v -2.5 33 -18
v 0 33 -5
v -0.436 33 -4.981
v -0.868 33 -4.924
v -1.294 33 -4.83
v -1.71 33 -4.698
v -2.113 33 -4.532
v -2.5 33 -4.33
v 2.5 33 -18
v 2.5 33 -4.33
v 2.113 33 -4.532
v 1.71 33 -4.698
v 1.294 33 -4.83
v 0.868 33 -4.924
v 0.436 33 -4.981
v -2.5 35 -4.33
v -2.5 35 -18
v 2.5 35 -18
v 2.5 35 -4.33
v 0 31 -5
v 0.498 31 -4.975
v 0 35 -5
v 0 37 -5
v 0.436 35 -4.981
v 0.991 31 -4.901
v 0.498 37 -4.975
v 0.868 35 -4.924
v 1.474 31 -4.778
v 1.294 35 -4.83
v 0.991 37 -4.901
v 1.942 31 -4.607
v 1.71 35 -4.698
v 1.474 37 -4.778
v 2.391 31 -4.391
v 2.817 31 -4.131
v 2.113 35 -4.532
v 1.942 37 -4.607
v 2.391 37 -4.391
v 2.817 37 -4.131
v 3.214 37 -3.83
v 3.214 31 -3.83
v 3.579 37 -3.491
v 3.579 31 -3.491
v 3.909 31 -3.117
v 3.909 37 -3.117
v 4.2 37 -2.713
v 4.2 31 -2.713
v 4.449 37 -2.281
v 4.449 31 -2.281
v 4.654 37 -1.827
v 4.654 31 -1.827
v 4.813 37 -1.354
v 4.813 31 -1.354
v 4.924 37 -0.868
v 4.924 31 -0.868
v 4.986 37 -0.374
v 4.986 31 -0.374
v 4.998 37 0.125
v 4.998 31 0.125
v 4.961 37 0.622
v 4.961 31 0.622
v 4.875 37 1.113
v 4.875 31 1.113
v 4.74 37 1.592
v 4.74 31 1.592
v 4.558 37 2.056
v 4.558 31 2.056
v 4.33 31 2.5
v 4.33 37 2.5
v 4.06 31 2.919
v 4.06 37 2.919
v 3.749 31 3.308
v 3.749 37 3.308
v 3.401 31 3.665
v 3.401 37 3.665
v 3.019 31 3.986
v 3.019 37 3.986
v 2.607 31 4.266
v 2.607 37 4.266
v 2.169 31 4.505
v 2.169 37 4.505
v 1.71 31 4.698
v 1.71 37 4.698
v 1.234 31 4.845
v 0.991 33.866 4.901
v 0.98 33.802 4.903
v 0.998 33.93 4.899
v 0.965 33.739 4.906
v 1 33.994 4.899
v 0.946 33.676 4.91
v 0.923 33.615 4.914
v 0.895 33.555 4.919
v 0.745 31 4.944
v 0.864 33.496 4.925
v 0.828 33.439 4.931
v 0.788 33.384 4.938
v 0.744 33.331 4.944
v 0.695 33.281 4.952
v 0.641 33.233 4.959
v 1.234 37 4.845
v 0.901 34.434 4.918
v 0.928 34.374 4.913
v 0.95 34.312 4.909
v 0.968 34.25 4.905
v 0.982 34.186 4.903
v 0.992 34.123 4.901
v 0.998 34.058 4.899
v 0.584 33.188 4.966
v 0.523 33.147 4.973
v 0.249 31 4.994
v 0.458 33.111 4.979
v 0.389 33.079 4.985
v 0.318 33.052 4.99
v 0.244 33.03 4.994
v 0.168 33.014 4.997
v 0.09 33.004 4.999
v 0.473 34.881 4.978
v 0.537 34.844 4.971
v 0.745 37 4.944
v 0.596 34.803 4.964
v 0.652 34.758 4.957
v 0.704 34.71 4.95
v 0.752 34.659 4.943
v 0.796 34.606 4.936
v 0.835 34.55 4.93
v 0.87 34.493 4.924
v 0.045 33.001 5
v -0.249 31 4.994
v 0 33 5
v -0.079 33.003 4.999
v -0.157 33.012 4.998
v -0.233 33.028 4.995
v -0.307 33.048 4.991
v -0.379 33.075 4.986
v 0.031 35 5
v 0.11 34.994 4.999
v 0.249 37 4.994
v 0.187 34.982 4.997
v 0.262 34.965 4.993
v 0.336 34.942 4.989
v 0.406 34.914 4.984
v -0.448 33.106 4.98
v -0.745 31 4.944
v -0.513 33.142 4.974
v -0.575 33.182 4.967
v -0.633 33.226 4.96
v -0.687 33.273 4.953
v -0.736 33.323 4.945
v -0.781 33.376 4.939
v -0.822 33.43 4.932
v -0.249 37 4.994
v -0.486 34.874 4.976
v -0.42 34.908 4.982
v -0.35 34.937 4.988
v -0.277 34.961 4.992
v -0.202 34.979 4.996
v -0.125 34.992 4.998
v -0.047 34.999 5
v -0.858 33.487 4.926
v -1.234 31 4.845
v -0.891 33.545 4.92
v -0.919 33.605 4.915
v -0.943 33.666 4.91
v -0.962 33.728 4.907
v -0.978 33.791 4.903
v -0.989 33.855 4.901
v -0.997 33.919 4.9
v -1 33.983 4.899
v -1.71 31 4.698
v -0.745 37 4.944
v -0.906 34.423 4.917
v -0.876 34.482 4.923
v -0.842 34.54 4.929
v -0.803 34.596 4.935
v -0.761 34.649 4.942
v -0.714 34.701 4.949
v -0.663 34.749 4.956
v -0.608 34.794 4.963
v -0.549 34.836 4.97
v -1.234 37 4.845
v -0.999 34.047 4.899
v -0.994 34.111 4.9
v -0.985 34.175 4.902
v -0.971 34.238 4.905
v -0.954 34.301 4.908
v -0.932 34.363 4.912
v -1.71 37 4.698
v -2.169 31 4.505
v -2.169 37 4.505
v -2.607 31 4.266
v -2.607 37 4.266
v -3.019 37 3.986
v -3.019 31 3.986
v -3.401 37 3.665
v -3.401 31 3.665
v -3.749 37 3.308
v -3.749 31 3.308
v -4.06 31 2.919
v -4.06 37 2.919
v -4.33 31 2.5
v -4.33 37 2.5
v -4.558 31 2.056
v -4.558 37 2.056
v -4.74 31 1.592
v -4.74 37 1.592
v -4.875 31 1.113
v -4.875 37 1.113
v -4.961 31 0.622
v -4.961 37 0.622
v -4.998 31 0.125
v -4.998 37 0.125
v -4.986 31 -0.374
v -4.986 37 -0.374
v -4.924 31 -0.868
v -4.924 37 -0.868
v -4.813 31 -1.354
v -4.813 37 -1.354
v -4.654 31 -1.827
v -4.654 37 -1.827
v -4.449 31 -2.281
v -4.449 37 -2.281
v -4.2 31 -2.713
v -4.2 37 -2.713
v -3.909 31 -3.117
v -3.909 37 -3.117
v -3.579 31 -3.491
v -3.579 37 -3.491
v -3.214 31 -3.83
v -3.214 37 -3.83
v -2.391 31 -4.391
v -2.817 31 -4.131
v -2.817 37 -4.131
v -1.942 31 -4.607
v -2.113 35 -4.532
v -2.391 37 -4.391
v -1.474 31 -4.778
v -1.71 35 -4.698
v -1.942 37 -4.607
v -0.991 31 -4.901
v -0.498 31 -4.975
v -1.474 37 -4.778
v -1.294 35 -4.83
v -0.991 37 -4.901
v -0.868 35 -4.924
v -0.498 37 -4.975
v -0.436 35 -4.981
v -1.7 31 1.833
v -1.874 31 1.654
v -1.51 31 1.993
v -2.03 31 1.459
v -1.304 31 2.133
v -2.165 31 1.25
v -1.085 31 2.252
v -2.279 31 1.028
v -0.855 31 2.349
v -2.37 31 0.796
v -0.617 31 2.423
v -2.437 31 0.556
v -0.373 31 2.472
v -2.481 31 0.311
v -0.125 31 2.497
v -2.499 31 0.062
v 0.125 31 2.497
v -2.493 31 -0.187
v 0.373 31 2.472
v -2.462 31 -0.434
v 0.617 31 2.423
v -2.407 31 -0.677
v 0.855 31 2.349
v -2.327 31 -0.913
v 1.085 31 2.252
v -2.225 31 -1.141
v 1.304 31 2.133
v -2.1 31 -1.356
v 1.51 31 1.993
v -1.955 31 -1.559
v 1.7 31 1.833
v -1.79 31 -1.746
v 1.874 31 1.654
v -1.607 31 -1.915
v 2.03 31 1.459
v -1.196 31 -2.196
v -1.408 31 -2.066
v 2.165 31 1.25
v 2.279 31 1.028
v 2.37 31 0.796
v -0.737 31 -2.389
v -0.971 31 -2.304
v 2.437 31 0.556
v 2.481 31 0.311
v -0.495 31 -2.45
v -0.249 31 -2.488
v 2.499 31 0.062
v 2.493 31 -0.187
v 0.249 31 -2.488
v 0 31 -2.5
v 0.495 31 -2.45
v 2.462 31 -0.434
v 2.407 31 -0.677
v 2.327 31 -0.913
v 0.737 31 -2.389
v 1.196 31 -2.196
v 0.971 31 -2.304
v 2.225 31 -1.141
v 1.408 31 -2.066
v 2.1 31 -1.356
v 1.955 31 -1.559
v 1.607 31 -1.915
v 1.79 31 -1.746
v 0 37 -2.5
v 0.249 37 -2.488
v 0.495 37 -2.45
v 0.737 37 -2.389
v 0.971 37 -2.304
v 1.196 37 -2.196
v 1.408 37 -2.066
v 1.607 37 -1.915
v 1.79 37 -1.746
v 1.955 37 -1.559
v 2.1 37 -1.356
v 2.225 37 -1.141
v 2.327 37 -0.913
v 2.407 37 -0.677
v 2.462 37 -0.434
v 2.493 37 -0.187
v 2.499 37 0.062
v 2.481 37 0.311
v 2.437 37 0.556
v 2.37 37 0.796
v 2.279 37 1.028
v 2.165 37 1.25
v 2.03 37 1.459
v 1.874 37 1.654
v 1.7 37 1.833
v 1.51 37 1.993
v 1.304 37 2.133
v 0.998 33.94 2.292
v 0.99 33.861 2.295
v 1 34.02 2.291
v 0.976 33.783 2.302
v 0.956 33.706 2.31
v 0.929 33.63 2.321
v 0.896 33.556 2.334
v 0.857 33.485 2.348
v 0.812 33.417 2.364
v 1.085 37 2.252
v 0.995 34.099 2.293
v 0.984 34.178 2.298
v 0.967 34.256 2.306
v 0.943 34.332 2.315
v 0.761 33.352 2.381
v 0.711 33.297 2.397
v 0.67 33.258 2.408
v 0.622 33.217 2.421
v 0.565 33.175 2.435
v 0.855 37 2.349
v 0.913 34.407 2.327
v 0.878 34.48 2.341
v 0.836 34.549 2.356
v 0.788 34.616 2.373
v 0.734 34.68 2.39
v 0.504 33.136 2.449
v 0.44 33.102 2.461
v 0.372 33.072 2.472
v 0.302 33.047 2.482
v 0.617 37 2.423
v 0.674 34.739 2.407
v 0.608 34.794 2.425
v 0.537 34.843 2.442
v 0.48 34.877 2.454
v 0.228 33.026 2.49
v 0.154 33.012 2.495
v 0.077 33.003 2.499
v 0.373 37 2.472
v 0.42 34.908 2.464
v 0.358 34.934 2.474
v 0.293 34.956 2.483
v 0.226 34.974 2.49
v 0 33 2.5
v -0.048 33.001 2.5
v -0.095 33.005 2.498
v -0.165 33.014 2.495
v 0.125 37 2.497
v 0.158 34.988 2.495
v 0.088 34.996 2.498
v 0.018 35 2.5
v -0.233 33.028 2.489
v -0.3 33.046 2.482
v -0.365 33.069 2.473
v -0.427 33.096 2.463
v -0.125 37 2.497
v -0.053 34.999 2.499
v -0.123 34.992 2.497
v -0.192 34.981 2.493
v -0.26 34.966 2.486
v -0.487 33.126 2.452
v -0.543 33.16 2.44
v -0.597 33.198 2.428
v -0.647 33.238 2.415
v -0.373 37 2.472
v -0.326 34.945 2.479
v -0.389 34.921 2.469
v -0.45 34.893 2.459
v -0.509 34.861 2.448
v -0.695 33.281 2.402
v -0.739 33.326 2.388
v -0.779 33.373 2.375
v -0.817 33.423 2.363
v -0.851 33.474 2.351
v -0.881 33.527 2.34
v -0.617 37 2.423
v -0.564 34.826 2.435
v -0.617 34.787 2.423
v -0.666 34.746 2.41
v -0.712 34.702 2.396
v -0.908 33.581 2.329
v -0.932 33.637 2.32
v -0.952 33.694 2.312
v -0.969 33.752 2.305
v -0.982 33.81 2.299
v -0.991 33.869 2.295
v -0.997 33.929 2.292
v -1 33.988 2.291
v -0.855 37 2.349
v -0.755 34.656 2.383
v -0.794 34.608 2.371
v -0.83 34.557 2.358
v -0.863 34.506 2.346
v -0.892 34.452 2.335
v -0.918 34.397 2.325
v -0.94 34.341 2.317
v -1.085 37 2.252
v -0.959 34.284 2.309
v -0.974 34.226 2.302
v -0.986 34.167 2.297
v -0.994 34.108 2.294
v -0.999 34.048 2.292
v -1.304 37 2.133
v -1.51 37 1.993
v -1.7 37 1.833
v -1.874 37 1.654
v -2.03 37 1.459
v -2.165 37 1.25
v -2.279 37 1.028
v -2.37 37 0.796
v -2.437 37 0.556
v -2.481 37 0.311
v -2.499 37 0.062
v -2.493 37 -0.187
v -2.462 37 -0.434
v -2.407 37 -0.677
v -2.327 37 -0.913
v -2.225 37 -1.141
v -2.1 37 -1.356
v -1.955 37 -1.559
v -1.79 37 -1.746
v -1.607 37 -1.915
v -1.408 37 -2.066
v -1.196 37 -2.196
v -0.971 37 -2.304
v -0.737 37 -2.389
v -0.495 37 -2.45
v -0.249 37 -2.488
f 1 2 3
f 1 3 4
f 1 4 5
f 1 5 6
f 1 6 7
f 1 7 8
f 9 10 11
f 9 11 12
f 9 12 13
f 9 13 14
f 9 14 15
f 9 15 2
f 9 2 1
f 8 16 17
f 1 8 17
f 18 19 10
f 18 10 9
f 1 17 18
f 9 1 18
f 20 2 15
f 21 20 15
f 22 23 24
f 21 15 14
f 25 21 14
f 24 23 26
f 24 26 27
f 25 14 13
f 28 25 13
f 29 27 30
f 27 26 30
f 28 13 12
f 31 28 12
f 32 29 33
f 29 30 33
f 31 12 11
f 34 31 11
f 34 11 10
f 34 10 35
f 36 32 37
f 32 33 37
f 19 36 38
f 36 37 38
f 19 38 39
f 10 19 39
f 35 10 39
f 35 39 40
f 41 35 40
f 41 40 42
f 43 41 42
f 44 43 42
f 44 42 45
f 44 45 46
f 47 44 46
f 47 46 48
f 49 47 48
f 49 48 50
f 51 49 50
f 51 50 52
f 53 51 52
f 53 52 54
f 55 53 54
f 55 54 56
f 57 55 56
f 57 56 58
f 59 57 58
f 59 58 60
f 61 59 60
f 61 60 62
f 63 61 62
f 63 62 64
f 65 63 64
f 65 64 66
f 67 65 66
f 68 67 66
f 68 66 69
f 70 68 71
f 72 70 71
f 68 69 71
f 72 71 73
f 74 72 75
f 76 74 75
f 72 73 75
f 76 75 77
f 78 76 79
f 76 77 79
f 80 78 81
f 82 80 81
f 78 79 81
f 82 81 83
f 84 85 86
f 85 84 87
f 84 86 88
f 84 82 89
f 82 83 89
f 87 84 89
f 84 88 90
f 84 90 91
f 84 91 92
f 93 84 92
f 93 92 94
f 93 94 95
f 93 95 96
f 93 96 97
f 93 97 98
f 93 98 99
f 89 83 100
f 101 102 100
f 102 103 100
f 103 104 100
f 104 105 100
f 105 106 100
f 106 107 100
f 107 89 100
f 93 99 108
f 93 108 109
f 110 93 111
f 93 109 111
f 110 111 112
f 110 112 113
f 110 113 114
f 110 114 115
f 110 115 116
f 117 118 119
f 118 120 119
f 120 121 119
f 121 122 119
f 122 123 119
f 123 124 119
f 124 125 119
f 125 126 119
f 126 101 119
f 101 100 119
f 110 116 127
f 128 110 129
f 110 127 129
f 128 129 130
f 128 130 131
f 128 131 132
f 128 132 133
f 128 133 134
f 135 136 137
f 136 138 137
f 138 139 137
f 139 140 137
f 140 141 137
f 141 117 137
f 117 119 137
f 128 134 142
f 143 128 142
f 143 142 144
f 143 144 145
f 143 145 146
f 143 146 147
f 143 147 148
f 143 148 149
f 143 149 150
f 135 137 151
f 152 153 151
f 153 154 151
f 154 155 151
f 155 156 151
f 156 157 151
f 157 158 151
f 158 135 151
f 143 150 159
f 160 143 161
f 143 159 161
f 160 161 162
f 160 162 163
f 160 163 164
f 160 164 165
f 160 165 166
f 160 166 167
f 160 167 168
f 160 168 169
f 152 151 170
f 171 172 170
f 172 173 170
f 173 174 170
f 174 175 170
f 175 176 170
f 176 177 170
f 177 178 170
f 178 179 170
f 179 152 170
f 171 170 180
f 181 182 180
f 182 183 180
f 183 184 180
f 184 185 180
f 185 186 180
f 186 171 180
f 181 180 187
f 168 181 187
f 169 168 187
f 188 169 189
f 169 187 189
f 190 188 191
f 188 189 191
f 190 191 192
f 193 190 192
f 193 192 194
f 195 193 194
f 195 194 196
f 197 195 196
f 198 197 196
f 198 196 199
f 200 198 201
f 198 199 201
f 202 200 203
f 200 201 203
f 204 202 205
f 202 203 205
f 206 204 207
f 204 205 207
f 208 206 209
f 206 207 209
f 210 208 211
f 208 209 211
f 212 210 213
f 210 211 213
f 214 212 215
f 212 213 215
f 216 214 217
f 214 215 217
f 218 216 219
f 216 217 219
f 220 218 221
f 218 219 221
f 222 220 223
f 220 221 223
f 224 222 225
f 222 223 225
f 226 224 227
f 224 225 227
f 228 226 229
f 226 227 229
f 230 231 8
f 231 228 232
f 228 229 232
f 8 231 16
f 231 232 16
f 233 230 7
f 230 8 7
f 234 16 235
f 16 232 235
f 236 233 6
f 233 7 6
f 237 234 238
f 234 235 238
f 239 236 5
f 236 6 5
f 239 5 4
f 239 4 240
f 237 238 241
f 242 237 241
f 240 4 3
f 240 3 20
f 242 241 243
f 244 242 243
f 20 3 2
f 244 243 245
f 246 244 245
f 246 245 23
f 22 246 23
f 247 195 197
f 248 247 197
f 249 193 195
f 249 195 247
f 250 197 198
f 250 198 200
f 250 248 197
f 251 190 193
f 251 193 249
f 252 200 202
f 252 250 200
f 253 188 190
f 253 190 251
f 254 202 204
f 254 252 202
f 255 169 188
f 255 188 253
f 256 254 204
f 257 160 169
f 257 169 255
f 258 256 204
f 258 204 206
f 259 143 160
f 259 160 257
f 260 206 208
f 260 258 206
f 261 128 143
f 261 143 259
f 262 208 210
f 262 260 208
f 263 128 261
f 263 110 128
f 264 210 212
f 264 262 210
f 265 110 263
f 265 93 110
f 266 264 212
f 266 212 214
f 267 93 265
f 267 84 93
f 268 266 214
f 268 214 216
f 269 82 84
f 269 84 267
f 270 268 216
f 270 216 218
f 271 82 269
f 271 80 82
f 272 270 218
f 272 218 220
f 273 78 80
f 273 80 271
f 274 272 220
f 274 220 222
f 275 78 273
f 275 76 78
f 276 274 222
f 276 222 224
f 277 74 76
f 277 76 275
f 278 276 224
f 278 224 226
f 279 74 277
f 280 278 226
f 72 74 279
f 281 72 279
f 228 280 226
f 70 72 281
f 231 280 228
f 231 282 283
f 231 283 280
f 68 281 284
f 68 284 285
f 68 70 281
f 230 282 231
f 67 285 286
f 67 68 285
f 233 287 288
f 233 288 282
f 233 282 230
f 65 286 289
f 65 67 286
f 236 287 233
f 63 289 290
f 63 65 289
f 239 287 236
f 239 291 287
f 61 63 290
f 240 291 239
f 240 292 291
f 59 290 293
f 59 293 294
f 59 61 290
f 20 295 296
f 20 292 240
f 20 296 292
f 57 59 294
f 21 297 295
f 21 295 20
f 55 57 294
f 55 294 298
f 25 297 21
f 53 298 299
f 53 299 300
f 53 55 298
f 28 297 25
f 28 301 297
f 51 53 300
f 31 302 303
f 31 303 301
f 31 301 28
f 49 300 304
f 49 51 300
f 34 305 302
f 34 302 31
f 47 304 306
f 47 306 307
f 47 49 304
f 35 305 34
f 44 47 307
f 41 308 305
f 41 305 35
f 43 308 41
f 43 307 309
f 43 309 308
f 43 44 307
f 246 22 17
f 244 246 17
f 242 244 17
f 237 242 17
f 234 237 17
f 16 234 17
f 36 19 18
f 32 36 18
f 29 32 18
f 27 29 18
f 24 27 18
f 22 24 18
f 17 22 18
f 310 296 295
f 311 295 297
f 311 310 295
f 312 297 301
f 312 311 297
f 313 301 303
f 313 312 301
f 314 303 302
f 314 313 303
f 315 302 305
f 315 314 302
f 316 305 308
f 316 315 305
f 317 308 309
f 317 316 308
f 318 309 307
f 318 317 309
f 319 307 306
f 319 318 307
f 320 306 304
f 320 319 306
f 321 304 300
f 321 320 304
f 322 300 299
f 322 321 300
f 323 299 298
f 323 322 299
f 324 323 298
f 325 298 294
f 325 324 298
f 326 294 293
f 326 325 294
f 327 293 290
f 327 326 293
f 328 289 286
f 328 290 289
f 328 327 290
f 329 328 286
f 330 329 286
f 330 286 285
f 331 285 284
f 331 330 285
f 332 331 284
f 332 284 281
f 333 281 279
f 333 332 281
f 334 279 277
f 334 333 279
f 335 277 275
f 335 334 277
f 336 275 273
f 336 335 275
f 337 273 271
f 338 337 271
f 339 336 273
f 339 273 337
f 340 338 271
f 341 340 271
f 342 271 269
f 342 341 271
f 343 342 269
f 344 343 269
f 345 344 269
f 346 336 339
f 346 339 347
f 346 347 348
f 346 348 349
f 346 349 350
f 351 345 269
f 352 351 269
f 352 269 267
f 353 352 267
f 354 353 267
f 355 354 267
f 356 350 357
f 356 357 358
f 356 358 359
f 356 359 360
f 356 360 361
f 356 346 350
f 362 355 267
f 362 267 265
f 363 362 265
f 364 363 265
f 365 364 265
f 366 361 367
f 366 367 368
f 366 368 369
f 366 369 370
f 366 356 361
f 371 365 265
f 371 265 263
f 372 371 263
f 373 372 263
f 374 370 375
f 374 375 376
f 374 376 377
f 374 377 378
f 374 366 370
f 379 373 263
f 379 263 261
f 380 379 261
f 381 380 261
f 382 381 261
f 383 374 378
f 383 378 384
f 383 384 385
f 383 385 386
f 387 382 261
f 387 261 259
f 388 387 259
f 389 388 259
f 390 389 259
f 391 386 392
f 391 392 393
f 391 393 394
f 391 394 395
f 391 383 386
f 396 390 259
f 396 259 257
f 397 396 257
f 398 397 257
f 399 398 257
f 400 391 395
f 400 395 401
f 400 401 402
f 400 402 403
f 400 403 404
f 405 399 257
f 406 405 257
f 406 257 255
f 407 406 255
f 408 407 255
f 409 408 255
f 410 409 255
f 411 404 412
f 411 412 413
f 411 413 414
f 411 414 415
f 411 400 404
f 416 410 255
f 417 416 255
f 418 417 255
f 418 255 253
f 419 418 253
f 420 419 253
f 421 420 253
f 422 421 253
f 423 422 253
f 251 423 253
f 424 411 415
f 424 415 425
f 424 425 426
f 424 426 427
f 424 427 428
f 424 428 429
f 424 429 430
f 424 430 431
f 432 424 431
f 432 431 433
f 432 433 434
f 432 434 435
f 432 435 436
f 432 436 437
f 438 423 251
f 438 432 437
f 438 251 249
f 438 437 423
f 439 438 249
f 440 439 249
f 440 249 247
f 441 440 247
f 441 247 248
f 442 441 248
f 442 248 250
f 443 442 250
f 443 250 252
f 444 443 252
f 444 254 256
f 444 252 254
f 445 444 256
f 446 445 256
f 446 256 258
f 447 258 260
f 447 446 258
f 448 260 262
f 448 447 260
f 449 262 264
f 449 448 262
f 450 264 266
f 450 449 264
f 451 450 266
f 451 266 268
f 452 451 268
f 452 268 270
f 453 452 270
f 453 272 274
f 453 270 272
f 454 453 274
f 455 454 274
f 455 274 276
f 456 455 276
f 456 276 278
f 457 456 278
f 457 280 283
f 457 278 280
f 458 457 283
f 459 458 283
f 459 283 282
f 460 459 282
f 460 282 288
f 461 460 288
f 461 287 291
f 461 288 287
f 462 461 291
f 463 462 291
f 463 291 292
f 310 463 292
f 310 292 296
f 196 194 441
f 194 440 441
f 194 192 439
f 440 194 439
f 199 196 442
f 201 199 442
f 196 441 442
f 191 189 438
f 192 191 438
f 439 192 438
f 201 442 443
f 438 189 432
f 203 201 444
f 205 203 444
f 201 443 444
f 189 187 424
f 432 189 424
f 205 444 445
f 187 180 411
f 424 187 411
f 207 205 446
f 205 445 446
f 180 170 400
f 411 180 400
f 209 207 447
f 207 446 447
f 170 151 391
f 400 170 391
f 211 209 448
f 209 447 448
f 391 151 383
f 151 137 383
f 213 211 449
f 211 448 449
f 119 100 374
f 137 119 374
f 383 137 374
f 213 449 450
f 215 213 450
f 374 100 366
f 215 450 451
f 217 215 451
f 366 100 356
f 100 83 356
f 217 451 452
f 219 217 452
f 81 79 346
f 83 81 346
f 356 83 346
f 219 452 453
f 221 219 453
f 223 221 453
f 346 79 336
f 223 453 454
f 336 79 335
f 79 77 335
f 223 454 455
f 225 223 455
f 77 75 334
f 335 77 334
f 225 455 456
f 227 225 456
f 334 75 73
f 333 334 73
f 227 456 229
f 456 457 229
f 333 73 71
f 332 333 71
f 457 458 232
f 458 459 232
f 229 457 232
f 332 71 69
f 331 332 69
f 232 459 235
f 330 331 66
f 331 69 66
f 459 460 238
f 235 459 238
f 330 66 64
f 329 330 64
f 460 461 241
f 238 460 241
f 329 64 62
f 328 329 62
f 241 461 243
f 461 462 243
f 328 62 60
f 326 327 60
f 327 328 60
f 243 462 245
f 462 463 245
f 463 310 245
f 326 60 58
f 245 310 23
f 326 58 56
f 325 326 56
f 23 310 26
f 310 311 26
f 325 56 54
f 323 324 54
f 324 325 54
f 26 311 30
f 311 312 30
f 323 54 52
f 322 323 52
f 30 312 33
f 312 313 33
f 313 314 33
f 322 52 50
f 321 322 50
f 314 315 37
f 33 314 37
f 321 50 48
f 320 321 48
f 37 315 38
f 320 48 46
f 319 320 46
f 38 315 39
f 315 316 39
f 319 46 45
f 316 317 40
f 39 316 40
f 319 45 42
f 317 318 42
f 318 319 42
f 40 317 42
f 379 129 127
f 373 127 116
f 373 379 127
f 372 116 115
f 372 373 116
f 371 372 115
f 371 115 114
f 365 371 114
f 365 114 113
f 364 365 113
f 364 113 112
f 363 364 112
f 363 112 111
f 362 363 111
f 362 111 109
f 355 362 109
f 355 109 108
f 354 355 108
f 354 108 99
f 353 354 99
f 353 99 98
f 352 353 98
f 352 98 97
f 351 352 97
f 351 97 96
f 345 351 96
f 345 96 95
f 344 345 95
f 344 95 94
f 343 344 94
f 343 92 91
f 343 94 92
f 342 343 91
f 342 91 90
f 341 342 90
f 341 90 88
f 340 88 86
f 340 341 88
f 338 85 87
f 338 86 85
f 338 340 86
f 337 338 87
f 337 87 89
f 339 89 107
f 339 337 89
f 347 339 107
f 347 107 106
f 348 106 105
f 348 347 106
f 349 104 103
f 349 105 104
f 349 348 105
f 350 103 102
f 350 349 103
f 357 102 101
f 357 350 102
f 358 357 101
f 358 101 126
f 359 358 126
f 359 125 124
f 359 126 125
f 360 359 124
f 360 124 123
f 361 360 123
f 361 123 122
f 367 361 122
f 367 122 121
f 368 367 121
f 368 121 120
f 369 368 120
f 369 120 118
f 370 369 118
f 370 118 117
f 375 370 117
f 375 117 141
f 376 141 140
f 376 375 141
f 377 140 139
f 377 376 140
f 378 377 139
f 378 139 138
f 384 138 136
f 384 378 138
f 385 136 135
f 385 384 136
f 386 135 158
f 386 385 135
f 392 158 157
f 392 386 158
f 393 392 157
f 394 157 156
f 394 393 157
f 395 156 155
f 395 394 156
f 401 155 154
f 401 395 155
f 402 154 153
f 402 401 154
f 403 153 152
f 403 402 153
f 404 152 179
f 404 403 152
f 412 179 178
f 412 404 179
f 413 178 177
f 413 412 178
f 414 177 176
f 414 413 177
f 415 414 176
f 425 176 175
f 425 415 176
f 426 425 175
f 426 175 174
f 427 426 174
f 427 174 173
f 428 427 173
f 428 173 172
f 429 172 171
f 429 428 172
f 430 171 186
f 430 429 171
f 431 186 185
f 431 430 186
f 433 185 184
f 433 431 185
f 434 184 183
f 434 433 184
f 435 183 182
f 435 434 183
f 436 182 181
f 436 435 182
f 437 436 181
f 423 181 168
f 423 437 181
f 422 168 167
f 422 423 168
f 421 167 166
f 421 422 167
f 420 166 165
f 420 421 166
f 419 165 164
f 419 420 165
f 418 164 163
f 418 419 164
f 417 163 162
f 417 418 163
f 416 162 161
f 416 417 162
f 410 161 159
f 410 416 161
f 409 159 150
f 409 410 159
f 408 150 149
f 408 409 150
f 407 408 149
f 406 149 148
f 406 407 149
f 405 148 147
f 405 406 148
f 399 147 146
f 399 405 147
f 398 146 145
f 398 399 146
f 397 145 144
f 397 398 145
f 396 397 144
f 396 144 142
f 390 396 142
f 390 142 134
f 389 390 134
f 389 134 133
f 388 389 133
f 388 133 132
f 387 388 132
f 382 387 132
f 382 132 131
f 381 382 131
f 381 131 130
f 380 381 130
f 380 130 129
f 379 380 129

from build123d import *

# Parameters (mm, degrees)
CYLINDER019_R             = 1
CYLINDER019_DEPTH         = 5
CYLINDER018_R             = 2.5
CYLINDER018_DEPTH         = 8
CYLINDER017_R             = 5
CYLINDER017_DEPTH         = 6
BOX002_W                  = 18
BOX002_H                  = 5
BOX002_DEPTH              = 2
CUT002002_PITCH_ANGLE     = 90
CUT002002_PLACEMENT_ANGLE = -90


with BuildPart() as cylinder019:
    # Cylinder019 → Cylinder019 (new body)
    with BuildSketch(Plane(origin=(0, 0, 3), x_dir=(0, 0, 1), z_dir=(-1, 0, 0))):
        Circle(CYLINDER019_R)
    extrude(amount=CYLINDER019_DEPTH)


with BuildPart() as fusion009:
    # Cylinder018 → Cylinder018 (new body)
    with BuildSketch(Plane.XY):
        Circle(CYLINDER018_R)
    extrude(amount=CYLINDER018_DEPTH)

    # Fusion009: union Cylinder019
    add(cylinder019.part)


with BuildPart() as cylinder017:
    # Cylinder017 → Cylinder017 (new body)
    with BuildSketch(Plane.XY):
        Circle(CYLINDER017_R)
    extrude(amount=CYLINDER017_DEPTH)


with BuildPart() as limitswitchpinhour:
    # Box002 → Box002 (new body)
    with BuildSketch(Plane(origin=(0, -2.5, 2), x_dir=(1, 0, 0), z_dir=(0, 0, 1))):
        with Locations((9, 2.5)):
            Rectangle(BOX002_W, BOX002_H)
    extrude(amount=BOX002_DEPTH)

    # Fusion008: union Cylinder017
    add(cylinder017.part)

    # Cut002002: cut Fusion009
    add(fusion009.part, mode=Mode.SUBTRACT)


with BuildPart() as limitswitchpinhour_1:
    # Cut002002 pitch: moved
    add(limitswitchpinhour.part.rotate(Axis((0, 0, 0), (0, 1, 0)), CUT002002_PITCH_ANGLE))


with BuildPart() as limitswitchpinhour_2:
    # Cut002002 placement: moved
    add(limitswitchpinhour_1.part.moved(Location((0, 37, 0))).rotate(Axis((0, 37, 0), (0, 0, 1)), CUT002002_PLACEMENT_ANGLE))


solid = limitswitchpinhour_2.part
